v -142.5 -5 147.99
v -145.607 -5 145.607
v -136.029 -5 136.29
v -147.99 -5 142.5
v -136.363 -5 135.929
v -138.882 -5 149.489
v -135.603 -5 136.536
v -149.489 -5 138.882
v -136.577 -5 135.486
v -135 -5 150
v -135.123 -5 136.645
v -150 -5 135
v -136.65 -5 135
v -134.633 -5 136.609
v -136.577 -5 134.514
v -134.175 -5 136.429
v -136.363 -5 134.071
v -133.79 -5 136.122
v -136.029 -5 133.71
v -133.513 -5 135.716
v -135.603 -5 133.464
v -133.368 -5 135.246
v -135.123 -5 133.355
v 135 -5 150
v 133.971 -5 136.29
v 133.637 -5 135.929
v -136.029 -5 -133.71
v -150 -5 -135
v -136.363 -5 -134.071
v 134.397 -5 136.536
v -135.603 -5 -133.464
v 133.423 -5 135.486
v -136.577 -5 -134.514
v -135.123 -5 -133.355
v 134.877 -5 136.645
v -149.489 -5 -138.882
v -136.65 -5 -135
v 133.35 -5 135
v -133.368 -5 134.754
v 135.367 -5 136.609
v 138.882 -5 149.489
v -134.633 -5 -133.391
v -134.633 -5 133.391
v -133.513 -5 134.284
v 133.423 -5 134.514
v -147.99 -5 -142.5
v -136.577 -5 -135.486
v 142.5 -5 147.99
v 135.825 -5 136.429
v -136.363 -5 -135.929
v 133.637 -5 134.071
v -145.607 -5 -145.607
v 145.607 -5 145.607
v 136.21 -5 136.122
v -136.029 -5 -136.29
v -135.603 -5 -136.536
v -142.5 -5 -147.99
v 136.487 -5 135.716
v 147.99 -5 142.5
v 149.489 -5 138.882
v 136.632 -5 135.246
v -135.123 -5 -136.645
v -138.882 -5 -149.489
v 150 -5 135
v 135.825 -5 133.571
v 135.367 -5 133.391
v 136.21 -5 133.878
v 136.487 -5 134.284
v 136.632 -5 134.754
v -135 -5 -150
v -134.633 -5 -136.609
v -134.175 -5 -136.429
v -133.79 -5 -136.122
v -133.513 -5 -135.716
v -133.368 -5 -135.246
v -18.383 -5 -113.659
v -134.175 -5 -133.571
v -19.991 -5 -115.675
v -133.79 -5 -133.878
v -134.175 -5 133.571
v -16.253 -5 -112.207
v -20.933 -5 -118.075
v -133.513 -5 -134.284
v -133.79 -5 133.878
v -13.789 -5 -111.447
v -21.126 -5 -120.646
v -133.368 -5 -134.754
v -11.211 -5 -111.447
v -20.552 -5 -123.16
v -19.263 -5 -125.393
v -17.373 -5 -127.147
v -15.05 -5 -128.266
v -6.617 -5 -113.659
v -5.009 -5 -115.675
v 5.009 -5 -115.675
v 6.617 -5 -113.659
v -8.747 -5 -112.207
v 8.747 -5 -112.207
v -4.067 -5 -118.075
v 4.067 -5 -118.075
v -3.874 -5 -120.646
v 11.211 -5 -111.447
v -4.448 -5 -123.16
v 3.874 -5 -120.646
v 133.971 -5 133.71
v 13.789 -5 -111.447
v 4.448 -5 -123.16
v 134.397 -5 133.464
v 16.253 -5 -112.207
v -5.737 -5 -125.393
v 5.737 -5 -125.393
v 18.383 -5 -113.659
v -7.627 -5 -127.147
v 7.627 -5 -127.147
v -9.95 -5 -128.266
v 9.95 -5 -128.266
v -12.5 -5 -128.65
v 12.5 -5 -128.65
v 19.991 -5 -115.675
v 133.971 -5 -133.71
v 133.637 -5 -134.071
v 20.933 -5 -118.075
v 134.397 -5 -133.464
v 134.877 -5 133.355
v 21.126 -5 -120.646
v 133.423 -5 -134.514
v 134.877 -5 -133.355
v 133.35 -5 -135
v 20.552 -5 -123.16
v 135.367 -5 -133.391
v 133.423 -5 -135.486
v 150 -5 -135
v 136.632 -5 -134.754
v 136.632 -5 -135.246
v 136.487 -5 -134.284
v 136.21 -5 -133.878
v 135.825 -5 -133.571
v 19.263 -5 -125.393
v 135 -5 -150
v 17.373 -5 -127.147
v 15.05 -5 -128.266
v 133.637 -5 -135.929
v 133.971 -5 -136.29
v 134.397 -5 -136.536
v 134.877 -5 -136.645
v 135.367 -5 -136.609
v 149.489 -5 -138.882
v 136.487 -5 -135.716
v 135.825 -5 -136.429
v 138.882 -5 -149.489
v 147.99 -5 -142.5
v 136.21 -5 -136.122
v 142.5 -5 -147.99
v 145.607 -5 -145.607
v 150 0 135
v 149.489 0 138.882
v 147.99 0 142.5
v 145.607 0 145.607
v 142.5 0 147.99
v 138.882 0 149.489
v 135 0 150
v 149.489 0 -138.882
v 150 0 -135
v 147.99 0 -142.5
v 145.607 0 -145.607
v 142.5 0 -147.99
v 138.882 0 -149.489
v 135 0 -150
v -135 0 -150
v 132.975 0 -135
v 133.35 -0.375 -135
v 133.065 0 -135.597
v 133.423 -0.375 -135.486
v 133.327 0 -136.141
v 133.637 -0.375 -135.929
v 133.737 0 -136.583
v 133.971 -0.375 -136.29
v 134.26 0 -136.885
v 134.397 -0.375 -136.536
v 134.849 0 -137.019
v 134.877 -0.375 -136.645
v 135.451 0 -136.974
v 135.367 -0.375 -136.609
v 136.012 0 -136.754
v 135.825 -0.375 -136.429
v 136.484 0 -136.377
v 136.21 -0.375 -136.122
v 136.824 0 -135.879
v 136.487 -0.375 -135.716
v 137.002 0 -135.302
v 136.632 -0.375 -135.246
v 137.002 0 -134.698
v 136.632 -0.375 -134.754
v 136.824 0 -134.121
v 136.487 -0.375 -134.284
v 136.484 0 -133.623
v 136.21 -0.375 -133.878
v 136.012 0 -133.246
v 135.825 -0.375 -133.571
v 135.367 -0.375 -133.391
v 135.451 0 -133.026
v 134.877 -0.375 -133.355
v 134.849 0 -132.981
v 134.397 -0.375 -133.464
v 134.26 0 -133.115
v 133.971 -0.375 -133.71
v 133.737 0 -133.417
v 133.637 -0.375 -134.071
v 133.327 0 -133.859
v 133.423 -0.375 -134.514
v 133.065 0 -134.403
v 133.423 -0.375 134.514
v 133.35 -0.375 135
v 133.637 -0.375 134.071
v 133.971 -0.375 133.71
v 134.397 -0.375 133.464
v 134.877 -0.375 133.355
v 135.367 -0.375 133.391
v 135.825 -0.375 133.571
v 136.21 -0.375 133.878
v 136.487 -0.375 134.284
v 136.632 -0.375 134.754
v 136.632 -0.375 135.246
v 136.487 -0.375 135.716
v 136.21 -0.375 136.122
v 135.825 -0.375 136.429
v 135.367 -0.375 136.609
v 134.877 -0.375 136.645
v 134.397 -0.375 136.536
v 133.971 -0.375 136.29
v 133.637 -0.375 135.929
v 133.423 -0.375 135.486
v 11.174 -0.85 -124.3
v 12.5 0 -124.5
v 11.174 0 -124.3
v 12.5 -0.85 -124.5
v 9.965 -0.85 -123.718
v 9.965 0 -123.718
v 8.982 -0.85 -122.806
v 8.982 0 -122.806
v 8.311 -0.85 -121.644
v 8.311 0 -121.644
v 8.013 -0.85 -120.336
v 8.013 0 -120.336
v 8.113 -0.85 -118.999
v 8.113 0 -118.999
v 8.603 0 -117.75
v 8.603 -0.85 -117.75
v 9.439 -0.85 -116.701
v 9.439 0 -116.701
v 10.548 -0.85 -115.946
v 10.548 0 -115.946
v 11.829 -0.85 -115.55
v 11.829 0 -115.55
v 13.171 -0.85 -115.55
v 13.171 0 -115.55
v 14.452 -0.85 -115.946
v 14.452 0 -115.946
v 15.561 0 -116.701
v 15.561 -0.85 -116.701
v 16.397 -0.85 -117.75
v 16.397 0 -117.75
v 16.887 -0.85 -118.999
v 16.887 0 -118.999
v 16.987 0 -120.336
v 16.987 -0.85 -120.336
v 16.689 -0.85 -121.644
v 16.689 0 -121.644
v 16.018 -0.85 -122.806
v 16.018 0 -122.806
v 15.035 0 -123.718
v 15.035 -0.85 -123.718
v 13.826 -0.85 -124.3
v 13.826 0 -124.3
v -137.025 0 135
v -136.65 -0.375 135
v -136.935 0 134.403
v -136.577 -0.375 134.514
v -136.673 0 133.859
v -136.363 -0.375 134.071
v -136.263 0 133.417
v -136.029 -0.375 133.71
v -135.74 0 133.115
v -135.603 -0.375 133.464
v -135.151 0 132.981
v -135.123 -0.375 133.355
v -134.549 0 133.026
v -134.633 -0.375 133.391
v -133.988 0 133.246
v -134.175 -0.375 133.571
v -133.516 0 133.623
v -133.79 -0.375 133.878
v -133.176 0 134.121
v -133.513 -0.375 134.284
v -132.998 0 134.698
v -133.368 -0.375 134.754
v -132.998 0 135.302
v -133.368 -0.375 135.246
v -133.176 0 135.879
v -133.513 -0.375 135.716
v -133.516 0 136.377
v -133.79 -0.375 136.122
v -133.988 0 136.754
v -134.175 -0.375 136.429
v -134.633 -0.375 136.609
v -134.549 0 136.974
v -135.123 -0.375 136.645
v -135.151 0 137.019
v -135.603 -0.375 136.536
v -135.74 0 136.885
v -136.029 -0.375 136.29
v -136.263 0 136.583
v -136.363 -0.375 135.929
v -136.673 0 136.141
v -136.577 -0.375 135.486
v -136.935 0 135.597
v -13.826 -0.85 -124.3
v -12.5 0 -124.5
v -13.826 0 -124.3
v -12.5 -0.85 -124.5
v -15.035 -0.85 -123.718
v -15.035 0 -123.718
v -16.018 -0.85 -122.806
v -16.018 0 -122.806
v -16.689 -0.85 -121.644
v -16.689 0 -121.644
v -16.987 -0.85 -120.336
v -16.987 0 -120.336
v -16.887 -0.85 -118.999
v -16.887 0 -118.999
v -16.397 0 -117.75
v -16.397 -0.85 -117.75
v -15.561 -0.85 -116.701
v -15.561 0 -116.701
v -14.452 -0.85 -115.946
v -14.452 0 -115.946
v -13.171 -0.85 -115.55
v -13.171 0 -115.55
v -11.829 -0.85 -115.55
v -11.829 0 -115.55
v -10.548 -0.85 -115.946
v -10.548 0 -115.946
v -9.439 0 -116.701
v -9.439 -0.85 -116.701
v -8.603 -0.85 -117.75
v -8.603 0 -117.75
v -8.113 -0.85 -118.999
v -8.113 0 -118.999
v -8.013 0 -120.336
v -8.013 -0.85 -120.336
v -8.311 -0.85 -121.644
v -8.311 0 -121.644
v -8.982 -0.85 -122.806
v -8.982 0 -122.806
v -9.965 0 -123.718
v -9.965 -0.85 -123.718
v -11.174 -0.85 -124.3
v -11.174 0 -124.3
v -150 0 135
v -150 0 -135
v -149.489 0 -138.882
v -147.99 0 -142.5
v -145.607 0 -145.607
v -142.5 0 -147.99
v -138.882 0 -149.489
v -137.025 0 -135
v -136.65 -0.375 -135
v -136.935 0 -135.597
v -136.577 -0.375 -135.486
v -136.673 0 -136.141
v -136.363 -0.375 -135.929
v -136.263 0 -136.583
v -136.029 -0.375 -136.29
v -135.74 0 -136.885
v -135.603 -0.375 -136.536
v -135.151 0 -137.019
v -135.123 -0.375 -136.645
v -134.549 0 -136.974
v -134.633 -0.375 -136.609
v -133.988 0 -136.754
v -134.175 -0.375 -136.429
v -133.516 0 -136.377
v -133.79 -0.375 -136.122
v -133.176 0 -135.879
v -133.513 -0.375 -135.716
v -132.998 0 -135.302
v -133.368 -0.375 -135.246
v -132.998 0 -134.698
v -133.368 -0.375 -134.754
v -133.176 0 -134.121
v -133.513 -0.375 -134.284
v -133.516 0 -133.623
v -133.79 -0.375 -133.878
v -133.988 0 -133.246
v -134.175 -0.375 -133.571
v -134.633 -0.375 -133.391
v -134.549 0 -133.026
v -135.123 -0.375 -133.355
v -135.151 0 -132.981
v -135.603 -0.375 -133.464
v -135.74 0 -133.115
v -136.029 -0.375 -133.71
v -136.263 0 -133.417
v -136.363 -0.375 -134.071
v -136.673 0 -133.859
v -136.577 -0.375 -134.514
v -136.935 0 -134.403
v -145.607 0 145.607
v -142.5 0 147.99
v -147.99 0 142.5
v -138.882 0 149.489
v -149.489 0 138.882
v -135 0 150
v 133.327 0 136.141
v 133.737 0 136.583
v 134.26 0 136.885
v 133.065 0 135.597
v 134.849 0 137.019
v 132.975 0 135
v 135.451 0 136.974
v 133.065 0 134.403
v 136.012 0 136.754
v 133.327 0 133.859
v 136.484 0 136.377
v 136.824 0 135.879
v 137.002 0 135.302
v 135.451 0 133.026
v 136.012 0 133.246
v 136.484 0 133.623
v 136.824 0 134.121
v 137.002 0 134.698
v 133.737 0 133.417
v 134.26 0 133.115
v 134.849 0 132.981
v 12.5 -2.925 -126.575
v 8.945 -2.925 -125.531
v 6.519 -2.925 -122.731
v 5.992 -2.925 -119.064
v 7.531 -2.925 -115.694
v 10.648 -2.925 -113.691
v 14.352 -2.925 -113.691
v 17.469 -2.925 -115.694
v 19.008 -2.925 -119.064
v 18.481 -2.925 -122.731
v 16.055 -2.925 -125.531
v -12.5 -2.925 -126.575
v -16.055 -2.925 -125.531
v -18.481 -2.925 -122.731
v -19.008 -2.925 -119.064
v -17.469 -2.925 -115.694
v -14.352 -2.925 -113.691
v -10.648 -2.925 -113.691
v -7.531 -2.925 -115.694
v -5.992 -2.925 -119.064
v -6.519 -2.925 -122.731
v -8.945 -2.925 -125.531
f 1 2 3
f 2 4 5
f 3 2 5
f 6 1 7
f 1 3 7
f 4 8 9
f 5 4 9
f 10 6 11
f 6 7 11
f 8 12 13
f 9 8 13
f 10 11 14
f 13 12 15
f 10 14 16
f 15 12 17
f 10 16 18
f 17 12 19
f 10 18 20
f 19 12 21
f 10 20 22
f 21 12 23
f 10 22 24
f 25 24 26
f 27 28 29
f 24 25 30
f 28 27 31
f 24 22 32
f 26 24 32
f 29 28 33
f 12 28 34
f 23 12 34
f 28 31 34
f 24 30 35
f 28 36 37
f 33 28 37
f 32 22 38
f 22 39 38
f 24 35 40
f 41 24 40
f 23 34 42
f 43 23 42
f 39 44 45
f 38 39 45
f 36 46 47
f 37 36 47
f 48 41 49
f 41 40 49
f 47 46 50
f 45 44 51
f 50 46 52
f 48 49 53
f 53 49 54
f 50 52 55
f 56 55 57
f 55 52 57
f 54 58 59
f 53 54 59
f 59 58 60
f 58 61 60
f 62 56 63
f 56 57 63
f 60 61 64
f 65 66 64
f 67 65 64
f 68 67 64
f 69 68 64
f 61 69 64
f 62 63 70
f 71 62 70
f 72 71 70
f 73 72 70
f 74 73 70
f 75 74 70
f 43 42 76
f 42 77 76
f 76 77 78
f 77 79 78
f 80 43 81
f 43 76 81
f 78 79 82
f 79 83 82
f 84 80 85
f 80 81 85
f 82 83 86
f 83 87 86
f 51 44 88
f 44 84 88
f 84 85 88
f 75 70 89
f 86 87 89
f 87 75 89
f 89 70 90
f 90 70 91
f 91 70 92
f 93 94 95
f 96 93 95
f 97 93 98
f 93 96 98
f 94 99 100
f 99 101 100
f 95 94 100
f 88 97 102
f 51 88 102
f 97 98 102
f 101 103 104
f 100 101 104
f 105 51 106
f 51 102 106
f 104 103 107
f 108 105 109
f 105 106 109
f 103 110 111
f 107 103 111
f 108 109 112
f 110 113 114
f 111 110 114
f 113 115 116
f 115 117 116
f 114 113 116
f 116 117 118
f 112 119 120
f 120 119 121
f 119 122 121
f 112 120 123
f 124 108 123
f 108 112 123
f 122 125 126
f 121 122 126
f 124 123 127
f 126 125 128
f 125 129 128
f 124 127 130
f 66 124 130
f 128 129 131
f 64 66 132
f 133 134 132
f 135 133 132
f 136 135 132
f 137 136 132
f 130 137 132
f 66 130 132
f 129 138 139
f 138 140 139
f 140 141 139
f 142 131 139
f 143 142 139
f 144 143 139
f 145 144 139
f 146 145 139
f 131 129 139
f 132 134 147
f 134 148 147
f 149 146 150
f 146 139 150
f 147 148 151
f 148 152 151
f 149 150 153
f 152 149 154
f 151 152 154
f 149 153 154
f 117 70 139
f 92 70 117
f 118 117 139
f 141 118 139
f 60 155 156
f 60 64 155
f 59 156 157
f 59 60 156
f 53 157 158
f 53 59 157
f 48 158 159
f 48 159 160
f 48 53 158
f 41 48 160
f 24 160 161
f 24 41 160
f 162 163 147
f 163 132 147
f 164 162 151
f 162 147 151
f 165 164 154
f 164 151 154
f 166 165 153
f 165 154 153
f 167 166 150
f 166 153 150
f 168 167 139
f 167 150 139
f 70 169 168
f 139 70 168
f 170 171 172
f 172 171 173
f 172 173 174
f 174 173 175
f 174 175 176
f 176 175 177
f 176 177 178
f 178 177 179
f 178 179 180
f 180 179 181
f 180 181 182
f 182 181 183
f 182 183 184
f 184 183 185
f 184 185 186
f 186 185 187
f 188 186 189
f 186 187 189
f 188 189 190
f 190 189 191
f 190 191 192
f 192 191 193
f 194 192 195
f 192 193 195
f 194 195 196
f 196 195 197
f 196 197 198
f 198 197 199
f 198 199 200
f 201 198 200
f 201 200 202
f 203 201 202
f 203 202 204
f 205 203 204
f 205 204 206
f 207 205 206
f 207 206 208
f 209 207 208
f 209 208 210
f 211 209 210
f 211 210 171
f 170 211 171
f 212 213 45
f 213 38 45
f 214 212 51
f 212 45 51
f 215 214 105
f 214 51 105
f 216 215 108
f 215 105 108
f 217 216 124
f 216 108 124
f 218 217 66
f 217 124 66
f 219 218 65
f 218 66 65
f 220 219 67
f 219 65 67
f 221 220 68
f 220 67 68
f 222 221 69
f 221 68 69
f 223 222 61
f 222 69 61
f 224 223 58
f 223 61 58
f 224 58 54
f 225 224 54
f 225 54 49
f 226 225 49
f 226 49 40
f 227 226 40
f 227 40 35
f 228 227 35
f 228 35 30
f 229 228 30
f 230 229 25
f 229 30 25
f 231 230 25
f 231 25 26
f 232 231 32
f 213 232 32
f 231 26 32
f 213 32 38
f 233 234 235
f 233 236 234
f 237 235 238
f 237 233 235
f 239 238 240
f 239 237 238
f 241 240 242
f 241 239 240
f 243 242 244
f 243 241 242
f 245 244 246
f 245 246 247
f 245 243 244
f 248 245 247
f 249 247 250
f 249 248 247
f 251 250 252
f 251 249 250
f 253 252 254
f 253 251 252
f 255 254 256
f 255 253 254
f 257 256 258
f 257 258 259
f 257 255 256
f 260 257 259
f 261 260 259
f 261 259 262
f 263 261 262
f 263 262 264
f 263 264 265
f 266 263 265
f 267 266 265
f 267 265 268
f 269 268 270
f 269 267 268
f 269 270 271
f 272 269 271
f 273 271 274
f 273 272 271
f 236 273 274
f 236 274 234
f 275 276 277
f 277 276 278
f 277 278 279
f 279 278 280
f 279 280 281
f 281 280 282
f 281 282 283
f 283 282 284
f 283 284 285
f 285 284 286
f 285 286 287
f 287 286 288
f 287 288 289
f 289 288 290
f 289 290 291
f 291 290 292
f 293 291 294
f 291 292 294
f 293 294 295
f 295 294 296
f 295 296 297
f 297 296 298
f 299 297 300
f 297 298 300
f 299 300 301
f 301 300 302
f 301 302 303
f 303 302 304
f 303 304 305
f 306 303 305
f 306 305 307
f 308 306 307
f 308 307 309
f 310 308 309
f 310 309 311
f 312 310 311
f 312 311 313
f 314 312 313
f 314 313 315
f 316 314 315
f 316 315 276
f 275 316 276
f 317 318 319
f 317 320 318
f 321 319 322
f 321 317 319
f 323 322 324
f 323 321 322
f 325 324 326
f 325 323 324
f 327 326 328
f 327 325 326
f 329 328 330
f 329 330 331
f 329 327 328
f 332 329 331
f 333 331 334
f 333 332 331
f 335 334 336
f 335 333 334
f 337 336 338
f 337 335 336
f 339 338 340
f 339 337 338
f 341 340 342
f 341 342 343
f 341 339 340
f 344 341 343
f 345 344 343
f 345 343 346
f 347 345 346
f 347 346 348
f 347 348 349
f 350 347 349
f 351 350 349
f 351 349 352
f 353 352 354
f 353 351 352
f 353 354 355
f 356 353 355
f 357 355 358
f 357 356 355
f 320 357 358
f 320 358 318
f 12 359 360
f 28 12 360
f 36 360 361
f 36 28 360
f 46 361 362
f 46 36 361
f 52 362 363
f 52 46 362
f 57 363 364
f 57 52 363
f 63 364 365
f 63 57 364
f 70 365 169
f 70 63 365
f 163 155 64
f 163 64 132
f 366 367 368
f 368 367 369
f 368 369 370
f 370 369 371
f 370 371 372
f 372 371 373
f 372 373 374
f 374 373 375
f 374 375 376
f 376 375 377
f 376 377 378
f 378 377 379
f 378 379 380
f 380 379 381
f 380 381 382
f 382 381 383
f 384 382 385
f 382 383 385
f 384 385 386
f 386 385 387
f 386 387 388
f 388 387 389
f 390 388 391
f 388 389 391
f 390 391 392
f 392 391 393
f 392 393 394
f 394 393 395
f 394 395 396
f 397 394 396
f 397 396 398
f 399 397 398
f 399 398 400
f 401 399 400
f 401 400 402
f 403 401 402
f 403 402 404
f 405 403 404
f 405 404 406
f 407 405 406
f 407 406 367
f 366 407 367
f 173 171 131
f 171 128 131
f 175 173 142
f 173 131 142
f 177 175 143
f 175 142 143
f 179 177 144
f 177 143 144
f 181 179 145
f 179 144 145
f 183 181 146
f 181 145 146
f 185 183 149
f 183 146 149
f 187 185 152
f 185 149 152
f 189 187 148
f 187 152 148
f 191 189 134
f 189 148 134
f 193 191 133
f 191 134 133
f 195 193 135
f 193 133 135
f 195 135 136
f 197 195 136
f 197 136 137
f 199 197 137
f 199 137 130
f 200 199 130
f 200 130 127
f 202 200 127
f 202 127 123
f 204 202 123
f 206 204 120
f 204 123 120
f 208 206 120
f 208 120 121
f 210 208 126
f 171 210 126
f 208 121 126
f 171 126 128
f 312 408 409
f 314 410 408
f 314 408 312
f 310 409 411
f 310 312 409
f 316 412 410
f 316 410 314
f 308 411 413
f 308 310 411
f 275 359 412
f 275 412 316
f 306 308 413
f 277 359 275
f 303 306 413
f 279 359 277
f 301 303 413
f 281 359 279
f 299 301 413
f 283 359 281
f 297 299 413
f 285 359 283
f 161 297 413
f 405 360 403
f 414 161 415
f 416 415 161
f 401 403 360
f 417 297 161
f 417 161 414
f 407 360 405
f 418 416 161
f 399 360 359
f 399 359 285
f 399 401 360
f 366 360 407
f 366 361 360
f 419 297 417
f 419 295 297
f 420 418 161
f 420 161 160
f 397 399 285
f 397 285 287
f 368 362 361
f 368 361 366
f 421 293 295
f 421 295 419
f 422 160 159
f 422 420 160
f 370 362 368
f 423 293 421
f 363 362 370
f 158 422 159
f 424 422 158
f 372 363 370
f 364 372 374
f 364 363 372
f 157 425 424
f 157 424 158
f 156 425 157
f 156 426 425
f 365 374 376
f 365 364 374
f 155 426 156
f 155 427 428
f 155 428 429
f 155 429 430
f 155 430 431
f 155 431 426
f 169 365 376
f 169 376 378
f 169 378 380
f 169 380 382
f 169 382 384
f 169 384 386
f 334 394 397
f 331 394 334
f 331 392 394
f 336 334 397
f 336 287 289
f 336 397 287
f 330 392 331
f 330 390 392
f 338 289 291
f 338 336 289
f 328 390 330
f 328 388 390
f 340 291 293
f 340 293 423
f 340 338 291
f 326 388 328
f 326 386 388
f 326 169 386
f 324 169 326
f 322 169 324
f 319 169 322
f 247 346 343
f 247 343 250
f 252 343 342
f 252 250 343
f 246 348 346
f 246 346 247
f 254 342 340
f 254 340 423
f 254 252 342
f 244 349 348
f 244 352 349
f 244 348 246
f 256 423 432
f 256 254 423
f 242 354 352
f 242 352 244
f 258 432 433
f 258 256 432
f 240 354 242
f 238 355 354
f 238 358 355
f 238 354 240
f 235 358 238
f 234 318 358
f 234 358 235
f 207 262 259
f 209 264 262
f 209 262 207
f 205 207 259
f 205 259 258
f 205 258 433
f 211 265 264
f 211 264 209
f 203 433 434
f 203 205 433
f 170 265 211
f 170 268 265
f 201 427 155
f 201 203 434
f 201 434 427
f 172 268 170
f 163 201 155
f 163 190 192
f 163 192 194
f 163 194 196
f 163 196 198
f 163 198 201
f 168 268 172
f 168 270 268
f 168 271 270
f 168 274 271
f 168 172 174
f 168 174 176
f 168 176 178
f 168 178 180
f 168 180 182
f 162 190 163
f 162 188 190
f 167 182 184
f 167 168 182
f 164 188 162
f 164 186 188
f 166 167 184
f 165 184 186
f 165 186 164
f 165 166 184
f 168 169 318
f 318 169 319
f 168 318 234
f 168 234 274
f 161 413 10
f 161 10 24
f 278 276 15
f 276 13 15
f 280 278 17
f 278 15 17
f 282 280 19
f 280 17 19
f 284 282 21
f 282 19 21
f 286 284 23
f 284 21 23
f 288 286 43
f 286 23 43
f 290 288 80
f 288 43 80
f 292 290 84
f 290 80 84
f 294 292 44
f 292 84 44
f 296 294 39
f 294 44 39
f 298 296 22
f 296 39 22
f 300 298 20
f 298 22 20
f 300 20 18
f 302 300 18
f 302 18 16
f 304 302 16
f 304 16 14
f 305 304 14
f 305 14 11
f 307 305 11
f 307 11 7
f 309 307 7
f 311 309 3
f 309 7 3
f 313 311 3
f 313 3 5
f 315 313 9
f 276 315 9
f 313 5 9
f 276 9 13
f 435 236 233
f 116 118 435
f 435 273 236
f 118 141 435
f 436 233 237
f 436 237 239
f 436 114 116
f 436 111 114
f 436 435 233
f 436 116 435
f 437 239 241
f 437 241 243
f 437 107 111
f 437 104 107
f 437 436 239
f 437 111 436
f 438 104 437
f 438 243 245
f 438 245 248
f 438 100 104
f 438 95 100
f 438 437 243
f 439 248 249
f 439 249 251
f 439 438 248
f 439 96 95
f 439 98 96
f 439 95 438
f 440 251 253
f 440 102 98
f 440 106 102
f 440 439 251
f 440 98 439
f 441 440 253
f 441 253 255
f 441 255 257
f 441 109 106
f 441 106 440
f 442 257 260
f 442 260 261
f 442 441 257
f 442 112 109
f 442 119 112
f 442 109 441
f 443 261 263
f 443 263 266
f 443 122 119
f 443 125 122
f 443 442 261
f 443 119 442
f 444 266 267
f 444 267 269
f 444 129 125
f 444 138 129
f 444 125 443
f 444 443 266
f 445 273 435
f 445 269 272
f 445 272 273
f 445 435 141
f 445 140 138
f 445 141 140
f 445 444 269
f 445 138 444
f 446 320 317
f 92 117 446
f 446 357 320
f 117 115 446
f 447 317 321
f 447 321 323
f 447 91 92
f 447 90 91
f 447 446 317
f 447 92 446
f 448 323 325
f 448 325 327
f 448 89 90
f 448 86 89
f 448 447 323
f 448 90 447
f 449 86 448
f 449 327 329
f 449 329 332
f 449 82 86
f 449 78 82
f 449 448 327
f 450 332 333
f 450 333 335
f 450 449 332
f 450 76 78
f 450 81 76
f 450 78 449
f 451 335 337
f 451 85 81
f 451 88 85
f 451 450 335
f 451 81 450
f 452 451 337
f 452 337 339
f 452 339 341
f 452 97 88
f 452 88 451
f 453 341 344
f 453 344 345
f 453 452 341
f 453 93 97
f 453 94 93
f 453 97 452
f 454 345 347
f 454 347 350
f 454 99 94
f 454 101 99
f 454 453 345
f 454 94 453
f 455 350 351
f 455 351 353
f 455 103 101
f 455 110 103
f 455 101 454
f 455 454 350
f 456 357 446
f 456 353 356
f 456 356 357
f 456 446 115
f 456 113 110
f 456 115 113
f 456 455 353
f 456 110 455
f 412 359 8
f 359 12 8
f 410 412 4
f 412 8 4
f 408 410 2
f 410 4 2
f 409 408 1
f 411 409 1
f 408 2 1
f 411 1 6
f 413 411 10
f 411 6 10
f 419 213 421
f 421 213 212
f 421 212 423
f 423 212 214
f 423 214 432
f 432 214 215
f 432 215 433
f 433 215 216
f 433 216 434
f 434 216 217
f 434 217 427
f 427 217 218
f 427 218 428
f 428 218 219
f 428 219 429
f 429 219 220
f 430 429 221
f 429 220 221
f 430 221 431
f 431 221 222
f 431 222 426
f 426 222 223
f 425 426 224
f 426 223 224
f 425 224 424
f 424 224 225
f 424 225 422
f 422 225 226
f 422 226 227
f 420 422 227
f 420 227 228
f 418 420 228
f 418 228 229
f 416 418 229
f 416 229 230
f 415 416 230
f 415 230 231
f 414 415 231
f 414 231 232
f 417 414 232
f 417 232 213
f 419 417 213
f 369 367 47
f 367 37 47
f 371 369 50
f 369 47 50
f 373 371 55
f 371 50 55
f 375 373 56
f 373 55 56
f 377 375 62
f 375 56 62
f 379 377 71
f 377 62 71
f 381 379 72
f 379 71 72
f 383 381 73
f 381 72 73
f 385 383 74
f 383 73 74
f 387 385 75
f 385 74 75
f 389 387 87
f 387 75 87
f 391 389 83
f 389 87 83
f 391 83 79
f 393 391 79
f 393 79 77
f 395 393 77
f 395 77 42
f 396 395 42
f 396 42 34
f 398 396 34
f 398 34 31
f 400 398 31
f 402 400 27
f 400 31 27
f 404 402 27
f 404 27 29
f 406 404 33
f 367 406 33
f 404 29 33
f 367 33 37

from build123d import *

# Parameters (mm, degrees)
ESQUISSE1_W                                 = 300
ESQUISSE1_H                                 = 300
T_LE_DE_BASE_PLI_E1_DEPTH                   = 5
FRAISAGE_POUR_VIS_T_TE_FRAIS_E_M81_AT_COUNT = 2
FRAISAGE_POUR_VIS_T_TE_FRAIS_E_M81_AT_PITCH = 25
TROU_TARAUD_M41_D                           = 3.3
TROU_TARAUD_M41_CSINK_D                     = 4.05
TROU_TARAUD_M41_CSINK_ANGLE                 = 90
CONG_1_R                                    = 15


# Sheet-metal steps are written as plain solids
with BuildPart() as part:
    # Esquisse1 → Tôle de base pliée1 (new body)
    with BuildSketch(Plane(origin=(0, 0, 0), x_dir=(1, 0, 0), z_dir=(0, 1, 0))):
        Rectangle(ESQUISSE1_W, ESQUISSE1_H)
    extrude(amount=-T_LE_DE_BASE_PLI_E1_DEPTH)

    # Esquisse3 → Fraisage pour vis à tête fraisée M81 (revolve, cut)
    with BuildSketch(Plane(origin=(12.5, -5, -120), x_dir=(0, 0, -1), z_dir=(1, 0, 0))):
        Polygon((0, 0), (0, 5), (4.5, 5), (4.5, 4.15), (8.65, 0), align=None)
    fraisage_pour_vis_t_te_frais_e_m81 = revolve(axis=Axis((12.5, -11.35, -120), (0, 1, 0)), mode=Mode.SUBTRACT)

    # Fraisage pour vis à tête fraisée M81 at: Fraisage pour vis à tête fraisée M81 ×2
    with Locations(*[(-i * FRAISAGE_POUR_VIS_T_TE_FRAIS_E_M81_AT_PITCH, 0, 0) for i in range(1, FRAISAGE_POUR_VIS_T_TE_FRAIS_E_M81_AT_COUNT)]):
        add(fraisage_pour_vis_t_te_frais_e_m81, mode=Mode.SUBTRACT)

    # Trou taraudé M41 (through all)
    with Locations(Plane(origin=(0, 0, 0), x_dir=(1, 0, 0), z_dir=(0, 1, 0))):
        with Locations((135, -135), (-135, -135), (-135, 135), (135, 135)):
            CounterSinkHole(TROU_TARAUD_M41_D / 2, TROU_TARAUD_M41_CSINK_D / 2, counter_sink_angle=TROU_TARAUD_M41_CSINK_ANGLE)

    # Congé1
    cong_1_edges = [part.edges().sort_by_distance(p)[0] for p in [
        (-150, -2.5, -150),
        (150, -2.5, -150),
        (150, -2.5, 150),
        (-150, -2.5, 150),
    ]]
    fillet(cong_1_edges, radius=CONG_1_R)


solid = part.part
